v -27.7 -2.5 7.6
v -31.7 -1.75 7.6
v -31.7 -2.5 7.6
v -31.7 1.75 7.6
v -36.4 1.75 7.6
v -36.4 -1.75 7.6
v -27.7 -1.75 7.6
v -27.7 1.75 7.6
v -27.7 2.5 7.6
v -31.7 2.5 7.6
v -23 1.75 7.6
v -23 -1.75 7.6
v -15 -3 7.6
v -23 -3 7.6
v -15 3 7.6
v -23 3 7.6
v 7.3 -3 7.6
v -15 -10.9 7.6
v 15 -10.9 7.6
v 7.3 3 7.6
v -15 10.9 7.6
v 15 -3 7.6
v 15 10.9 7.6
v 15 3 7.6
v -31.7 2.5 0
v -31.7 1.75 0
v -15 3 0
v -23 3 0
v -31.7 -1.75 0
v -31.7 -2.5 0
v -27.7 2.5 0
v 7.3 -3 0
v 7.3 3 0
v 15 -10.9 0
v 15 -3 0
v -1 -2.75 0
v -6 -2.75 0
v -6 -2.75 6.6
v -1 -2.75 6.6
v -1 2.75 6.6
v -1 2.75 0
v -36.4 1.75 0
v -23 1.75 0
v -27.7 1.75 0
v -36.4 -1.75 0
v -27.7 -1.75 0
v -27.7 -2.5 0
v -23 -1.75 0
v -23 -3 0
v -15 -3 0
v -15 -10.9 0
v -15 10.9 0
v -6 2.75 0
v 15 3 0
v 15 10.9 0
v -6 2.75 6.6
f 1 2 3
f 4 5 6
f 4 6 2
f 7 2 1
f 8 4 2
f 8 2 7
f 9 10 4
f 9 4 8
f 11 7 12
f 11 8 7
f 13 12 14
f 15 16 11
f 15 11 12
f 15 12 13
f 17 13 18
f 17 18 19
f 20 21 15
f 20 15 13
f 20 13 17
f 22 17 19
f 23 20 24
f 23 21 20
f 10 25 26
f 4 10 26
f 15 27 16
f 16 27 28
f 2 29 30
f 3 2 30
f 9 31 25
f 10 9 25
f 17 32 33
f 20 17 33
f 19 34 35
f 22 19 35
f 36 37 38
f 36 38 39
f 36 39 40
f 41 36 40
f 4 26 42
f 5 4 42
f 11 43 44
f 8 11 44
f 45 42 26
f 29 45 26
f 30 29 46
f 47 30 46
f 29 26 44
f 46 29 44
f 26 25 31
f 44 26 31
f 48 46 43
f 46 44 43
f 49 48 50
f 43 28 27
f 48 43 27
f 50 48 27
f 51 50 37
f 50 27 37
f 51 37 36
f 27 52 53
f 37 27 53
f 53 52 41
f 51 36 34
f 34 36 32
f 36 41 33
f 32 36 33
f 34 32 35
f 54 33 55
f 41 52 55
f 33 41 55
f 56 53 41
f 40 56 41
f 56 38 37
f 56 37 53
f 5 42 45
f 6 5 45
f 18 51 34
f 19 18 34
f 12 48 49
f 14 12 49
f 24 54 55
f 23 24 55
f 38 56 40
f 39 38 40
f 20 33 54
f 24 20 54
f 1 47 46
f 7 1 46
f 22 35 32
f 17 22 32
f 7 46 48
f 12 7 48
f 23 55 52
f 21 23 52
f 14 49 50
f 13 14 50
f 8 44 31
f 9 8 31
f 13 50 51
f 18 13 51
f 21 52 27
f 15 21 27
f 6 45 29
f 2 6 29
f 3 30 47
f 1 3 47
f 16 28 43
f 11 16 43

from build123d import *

# Parameters (mm, degrees)
F0_W     = 5
F0_H     = 5.5
F1_DEPTH = 7.6
F2_W     = 5
F2_H     = 5.5
F3_DEPTH = 1


with BuildPart() as f1:
    # F0 (on Top) → F1 (new body)
    with BuildSketch(Plane.XY):
        Polygon((-23, -3), (-15, -3), (-15, 3), (-23, 3), (-23, 1.75), (-27.7, 1.75), (-27.7, 2.5), (-31.7, 2.5), (-31.7, 1.75), (-36.4, 1.75), (-36.4, -1.75), (-31.7, -1.75), (-31.7, -2.5), (-27.7, -2.5), (-27.7, -1.75), (-23, -1.75), align=None)
        Polygon((-15, -3), (-15, -10.9), (15, -10.9), (15, -3), (7.3, -3), (7.3, 3), (15, 3), (15, 10.9), (-15, 10.9), (-15, 3), align=None)
        with Locations((-3.5, 0)):
            Rectangle(F0_W, F0_H, mode=Mode.SUBTRACT)
    extrude(amount=F1_DEPTH)

    # F2 (on face) → F3 (join)
    with BuildSketch(Plane.XY.offset(7.6)):
        with Locations((-3.5, 0)):
            Rectangle(F2_W, F2_H)
    extrude(amount=-F3_DEPTH)


solid = f1.part
